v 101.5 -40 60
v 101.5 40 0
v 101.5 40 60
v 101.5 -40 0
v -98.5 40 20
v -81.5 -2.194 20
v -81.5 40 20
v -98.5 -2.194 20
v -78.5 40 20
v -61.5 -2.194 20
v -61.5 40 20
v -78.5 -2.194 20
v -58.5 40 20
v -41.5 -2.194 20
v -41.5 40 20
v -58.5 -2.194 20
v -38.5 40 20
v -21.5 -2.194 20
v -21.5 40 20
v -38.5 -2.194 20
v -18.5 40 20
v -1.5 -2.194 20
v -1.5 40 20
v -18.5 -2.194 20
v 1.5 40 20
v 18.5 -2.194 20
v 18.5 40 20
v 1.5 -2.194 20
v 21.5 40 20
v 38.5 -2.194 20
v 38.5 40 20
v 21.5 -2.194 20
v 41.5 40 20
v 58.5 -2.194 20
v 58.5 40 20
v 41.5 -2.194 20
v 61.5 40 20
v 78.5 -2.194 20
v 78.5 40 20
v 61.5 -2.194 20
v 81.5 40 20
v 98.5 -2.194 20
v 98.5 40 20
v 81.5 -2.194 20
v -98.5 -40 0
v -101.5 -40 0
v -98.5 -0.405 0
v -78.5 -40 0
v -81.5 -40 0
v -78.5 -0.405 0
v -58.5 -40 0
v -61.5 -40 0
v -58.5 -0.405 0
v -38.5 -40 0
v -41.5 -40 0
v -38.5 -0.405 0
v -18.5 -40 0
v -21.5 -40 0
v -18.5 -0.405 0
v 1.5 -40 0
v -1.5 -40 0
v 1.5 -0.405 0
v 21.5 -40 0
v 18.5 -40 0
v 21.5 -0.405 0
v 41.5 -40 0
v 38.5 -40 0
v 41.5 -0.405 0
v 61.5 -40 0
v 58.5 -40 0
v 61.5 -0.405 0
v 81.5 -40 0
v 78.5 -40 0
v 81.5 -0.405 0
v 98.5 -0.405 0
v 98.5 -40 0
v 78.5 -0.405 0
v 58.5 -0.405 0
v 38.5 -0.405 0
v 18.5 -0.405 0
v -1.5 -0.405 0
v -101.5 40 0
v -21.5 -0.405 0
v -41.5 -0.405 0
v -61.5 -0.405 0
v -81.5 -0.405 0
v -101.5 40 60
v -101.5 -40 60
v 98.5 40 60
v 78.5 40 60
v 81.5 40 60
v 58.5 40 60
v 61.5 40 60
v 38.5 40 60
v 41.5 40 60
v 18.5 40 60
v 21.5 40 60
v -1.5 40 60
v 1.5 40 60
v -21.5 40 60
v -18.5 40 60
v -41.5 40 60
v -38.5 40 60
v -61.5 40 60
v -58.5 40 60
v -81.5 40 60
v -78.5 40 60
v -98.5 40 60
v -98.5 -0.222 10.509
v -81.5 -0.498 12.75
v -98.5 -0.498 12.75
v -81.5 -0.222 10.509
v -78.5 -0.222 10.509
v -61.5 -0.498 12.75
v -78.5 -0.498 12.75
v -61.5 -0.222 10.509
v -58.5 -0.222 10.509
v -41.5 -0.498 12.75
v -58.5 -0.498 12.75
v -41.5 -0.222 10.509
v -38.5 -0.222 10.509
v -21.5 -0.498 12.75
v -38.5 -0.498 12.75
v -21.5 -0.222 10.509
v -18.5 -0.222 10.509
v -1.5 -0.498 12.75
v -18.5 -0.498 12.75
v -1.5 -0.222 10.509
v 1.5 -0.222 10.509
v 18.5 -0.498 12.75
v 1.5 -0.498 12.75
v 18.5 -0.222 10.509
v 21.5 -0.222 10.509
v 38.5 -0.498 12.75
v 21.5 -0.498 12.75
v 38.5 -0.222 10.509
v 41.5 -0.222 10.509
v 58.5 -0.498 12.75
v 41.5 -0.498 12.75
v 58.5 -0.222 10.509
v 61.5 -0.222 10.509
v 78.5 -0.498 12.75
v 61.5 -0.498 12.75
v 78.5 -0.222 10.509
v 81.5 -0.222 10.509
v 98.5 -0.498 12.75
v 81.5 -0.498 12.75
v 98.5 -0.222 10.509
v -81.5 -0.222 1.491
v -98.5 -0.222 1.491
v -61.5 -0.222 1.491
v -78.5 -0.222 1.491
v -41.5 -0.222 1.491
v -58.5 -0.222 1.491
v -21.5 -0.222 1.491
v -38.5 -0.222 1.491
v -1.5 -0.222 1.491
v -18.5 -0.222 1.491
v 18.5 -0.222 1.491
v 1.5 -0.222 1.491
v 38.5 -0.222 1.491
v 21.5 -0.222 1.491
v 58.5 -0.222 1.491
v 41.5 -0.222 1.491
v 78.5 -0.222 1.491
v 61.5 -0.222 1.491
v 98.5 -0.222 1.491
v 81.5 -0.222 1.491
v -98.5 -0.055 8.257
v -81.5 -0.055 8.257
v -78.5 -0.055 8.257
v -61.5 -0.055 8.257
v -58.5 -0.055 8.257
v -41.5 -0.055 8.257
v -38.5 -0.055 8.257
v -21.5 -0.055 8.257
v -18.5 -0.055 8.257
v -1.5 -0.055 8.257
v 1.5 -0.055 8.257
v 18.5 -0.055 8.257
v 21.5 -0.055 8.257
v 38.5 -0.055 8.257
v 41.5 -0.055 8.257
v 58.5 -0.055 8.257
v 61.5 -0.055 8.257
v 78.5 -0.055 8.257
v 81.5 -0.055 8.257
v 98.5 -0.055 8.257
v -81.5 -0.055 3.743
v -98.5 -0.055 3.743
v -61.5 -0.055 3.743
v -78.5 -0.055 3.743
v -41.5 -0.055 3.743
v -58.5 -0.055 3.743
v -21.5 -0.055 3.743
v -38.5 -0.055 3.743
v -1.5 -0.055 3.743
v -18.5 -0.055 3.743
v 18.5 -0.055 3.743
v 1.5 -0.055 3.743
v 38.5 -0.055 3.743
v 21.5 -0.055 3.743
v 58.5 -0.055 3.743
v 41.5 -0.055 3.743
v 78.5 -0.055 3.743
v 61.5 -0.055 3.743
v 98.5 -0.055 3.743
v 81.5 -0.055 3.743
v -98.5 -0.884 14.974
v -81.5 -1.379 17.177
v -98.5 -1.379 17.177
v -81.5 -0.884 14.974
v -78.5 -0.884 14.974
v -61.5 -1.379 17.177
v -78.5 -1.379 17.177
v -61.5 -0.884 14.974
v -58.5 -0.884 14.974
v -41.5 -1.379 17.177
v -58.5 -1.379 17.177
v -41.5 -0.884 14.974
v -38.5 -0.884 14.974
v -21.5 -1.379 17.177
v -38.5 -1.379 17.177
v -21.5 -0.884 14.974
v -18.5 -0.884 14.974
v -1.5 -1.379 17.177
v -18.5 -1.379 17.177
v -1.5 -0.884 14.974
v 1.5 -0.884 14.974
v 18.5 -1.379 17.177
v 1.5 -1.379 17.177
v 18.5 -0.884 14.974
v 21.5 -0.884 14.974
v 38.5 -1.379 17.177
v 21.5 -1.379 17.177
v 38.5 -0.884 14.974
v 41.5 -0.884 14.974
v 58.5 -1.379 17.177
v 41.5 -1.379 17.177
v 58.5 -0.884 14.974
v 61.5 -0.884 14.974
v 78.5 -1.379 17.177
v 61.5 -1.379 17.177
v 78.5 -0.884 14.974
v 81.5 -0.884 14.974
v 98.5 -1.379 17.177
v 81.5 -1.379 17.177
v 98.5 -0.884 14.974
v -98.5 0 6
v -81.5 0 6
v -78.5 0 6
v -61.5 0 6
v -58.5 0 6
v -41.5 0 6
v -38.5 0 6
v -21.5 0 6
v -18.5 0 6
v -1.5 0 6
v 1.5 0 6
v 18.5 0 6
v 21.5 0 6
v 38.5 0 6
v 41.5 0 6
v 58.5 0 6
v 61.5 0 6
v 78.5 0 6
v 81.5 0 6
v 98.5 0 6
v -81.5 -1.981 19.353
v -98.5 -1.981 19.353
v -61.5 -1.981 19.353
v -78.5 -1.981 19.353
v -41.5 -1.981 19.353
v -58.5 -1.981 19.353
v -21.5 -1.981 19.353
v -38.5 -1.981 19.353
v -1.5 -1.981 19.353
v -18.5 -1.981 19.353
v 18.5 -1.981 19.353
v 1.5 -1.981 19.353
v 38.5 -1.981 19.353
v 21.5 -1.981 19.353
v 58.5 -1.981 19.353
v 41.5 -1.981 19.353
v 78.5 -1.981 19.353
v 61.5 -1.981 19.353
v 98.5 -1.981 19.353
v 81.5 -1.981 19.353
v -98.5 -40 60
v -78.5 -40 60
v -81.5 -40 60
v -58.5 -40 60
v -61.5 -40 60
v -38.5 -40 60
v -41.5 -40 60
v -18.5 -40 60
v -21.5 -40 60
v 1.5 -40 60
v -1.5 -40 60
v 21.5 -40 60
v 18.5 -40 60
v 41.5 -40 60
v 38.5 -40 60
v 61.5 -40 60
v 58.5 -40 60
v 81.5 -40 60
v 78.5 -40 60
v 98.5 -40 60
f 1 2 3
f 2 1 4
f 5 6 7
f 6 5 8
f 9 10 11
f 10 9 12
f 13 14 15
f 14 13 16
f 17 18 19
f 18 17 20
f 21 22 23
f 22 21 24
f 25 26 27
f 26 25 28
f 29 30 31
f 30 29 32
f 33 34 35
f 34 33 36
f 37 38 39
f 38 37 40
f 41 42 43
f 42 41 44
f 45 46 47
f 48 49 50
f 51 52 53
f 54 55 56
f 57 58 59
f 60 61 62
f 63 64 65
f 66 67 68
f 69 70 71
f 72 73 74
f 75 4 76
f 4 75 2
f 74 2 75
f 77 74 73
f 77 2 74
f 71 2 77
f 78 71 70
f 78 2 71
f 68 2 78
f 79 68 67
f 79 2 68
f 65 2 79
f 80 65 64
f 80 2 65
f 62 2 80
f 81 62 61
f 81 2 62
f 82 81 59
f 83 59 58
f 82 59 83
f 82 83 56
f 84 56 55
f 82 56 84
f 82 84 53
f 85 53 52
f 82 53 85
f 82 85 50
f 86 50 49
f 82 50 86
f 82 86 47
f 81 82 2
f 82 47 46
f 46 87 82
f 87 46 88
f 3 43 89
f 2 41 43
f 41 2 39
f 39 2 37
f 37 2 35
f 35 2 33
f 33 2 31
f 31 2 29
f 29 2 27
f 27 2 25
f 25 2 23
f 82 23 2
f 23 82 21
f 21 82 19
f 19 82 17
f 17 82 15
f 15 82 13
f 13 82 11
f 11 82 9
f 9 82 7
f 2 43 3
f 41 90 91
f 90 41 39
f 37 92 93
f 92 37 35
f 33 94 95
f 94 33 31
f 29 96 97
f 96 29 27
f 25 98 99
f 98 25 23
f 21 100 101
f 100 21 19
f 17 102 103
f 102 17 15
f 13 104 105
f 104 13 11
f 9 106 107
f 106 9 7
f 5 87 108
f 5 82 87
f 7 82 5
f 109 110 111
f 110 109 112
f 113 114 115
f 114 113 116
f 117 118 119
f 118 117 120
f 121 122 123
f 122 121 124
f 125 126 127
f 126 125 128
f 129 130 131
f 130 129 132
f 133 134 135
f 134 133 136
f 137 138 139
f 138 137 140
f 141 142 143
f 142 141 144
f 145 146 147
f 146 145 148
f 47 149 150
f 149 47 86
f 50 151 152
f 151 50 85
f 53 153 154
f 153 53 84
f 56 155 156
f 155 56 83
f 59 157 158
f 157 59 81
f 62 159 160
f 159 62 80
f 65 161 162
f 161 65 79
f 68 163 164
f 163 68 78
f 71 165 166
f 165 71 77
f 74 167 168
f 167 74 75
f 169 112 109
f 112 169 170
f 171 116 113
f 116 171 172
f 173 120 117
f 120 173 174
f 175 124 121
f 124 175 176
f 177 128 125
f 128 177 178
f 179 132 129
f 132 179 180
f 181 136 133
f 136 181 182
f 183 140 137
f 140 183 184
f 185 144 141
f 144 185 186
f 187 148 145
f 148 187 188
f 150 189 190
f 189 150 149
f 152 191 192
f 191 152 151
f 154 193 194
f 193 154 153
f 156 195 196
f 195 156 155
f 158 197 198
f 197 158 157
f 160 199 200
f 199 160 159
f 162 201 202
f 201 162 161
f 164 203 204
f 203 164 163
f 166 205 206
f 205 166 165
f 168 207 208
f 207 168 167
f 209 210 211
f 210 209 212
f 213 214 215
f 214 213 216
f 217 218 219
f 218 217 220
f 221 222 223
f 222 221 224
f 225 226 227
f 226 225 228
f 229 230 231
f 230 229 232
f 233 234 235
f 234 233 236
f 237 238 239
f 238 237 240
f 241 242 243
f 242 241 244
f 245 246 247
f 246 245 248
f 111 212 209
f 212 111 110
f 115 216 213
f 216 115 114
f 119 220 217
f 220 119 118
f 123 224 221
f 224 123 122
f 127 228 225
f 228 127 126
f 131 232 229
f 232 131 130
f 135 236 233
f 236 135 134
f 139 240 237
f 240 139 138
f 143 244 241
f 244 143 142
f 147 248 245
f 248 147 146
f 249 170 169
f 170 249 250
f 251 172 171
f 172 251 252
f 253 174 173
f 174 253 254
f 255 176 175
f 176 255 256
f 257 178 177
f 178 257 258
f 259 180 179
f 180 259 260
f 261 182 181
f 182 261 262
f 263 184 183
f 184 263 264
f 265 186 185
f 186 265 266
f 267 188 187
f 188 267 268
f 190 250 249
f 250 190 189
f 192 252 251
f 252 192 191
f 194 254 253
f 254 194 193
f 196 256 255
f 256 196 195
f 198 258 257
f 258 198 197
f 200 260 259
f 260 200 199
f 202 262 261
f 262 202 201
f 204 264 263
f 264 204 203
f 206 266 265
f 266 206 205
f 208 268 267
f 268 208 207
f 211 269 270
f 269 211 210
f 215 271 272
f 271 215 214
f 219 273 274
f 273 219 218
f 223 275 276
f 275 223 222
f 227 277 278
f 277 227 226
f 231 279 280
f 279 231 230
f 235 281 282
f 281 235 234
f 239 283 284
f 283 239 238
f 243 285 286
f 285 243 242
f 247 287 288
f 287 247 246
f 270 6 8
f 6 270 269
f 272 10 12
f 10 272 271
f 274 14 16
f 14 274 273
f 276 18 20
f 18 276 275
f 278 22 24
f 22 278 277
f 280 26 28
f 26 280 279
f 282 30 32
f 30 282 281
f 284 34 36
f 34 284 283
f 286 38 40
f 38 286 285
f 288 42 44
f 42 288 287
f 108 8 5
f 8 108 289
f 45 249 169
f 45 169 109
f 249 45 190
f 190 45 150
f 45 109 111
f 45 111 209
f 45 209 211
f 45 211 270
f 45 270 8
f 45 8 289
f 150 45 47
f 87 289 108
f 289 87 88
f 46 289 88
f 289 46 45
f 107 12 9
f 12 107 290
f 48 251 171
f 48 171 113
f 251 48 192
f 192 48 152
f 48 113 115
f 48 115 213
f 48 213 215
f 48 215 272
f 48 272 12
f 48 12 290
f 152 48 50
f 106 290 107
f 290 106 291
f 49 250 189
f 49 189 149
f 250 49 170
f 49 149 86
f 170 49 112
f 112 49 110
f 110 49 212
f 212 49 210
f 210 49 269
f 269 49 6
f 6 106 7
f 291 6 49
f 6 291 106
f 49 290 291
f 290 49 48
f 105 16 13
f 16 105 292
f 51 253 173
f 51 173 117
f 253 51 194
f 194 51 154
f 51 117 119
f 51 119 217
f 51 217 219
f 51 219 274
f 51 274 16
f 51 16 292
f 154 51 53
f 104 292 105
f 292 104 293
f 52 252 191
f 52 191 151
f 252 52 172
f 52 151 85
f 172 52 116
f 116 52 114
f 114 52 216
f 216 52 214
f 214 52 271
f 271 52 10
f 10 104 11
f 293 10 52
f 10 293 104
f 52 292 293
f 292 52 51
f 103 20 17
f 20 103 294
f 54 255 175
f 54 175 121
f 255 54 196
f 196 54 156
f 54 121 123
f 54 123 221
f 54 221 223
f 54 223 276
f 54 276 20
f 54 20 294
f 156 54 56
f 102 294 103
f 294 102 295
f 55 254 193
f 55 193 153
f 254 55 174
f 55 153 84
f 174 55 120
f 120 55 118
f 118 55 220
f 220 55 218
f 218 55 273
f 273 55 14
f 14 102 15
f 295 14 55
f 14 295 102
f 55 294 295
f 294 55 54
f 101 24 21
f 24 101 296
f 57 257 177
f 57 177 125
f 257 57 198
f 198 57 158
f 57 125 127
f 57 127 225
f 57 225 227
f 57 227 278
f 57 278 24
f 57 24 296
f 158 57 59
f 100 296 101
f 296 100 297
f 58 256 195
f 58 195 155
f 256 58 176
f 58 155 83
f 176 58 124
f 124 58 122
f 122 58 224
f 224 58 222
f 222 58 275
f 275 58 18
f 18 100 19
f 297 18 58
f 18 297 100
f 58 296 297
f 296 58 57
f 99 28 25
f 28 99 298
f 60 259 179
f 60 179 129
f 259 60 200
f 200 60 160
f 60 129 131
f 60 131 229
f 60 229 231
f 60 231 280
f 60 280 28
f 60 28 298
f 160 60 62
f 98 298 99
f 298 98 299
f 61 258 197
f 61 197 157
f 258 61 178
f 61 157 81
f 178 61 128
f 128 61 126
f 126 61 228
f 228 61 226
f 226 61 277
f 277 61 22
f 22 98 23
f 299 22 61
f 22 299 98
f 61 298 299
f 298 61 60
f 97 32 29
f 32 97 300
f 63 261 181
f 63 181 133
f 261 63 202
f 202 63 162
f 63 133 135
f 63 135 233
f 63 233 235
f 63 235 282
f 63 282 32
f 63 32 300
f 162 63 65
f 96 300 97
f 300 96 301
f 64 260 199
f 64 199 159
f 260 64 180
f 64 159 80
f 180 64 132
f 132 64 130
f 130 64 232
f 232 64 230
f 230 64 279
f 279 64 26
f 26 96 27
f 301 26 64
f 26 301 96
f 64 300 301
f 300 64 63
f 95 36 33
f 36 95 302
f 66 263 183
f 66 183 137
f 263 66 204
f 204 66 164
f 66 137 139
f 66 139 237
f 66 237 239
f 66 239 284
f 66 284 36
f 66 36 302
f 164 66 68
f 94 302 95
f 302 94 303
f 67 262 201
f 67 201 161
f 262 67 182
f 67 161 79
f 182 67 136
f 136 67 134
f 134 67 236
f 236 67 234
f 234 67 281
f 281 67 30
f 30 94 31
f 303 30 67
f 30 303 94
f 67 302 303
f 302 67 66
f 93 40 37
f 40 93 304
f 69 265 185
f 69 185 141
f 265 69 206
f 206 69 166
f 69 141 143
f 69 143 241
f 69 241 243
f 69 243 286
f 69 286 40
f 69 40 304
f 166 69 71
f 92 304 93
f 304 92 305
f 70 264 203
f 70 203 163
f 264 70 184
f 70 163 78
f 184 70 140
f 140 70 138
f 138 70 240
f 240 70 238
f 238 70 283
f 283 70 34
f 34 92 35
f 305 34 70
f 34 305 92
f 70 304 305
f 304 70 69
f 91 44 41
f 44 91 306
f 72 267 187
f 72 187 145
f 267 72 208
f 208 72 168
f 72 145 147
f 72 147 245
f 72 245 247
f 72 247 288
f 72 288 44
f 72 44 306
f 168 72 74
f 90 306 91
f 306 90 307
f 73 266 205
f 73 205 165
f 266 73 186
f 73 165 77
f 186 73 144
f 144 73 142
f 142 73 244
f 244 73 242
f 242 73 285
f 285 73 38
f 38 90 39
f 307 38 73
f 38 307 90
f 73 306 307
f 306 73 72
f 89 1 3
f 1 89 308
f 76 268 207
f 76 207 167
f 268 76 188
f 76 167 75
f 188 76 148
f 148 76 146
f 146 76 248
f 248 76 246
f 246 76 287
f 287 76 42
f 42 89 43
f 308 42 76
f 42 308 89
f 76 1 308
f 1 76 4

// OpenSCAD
// Petri Dish Rack
// Designed for 90mm diameter dishes standing on edge.

// Dimensions
L         = 203;    // Base length (X)
W         = 80;     // Base width (Y)
H_base    = 20;     // Base height (Z)
dish_rad  = 45;     // Radius of 90mm dish
cradle_r  = 46;     // Radius of the cradle cutout
cradle_z  = 52;    // Z-coordinate of the cylinder axis
cradle_y  = 0;     // Y-coordinate of the cylinder axis (centered)
divider_t = 3;      // Thickness of divider plates
divider_h  = 60;    // Height of divider plates
num_divs  = 11;     // Number of divider plates

$fn = 128;

// Modules
module base_part() {
    translate([-L/2, -W/2, 0])
        cube([L, W, H_base]);
}

module cradle_cutout() {
    // The cradle is a cylinder axis along X.
    // Axis is at y = 0, z = 52.
    // Radius is 46.
    // Bottom of cradle: 52 - 46 = 6mm.
    // We extend the cylinder in X to ensure a clean cut.
    translate([-L/2 - 1, -cradle_r, cradle_z - cradle_r])
        rotate([0, 90, 0])
            cylinder(h = L + 2, r = cradle_r);
}

module divider_part(x_pos) {
    // Dividers are 3mm thick in X, 80mm wide in Y, 60mm tall in Z.
    // They are centered on the x_pos.
    translate([x_pos - divider_t/2, -W/2, 0])
        cube([divider_t, W, divider_h]);
}

// Final Assembly
// We use union to ensure it is a single solid body.
// We subtract the cradle from the base only, then add the dividers.
union() {
    // The Base with the cradle cut out
    difference() {
        base_part();
        cradle_cutout();
    }
    
    // The 11 Divider plates
    // Spaced 20mm apart from -100 to 100
    for (i = [0 : num_divs - 1]) {
        x_pos = -100 + (i * 20);
        divider_part(x_pos);
    }
}
